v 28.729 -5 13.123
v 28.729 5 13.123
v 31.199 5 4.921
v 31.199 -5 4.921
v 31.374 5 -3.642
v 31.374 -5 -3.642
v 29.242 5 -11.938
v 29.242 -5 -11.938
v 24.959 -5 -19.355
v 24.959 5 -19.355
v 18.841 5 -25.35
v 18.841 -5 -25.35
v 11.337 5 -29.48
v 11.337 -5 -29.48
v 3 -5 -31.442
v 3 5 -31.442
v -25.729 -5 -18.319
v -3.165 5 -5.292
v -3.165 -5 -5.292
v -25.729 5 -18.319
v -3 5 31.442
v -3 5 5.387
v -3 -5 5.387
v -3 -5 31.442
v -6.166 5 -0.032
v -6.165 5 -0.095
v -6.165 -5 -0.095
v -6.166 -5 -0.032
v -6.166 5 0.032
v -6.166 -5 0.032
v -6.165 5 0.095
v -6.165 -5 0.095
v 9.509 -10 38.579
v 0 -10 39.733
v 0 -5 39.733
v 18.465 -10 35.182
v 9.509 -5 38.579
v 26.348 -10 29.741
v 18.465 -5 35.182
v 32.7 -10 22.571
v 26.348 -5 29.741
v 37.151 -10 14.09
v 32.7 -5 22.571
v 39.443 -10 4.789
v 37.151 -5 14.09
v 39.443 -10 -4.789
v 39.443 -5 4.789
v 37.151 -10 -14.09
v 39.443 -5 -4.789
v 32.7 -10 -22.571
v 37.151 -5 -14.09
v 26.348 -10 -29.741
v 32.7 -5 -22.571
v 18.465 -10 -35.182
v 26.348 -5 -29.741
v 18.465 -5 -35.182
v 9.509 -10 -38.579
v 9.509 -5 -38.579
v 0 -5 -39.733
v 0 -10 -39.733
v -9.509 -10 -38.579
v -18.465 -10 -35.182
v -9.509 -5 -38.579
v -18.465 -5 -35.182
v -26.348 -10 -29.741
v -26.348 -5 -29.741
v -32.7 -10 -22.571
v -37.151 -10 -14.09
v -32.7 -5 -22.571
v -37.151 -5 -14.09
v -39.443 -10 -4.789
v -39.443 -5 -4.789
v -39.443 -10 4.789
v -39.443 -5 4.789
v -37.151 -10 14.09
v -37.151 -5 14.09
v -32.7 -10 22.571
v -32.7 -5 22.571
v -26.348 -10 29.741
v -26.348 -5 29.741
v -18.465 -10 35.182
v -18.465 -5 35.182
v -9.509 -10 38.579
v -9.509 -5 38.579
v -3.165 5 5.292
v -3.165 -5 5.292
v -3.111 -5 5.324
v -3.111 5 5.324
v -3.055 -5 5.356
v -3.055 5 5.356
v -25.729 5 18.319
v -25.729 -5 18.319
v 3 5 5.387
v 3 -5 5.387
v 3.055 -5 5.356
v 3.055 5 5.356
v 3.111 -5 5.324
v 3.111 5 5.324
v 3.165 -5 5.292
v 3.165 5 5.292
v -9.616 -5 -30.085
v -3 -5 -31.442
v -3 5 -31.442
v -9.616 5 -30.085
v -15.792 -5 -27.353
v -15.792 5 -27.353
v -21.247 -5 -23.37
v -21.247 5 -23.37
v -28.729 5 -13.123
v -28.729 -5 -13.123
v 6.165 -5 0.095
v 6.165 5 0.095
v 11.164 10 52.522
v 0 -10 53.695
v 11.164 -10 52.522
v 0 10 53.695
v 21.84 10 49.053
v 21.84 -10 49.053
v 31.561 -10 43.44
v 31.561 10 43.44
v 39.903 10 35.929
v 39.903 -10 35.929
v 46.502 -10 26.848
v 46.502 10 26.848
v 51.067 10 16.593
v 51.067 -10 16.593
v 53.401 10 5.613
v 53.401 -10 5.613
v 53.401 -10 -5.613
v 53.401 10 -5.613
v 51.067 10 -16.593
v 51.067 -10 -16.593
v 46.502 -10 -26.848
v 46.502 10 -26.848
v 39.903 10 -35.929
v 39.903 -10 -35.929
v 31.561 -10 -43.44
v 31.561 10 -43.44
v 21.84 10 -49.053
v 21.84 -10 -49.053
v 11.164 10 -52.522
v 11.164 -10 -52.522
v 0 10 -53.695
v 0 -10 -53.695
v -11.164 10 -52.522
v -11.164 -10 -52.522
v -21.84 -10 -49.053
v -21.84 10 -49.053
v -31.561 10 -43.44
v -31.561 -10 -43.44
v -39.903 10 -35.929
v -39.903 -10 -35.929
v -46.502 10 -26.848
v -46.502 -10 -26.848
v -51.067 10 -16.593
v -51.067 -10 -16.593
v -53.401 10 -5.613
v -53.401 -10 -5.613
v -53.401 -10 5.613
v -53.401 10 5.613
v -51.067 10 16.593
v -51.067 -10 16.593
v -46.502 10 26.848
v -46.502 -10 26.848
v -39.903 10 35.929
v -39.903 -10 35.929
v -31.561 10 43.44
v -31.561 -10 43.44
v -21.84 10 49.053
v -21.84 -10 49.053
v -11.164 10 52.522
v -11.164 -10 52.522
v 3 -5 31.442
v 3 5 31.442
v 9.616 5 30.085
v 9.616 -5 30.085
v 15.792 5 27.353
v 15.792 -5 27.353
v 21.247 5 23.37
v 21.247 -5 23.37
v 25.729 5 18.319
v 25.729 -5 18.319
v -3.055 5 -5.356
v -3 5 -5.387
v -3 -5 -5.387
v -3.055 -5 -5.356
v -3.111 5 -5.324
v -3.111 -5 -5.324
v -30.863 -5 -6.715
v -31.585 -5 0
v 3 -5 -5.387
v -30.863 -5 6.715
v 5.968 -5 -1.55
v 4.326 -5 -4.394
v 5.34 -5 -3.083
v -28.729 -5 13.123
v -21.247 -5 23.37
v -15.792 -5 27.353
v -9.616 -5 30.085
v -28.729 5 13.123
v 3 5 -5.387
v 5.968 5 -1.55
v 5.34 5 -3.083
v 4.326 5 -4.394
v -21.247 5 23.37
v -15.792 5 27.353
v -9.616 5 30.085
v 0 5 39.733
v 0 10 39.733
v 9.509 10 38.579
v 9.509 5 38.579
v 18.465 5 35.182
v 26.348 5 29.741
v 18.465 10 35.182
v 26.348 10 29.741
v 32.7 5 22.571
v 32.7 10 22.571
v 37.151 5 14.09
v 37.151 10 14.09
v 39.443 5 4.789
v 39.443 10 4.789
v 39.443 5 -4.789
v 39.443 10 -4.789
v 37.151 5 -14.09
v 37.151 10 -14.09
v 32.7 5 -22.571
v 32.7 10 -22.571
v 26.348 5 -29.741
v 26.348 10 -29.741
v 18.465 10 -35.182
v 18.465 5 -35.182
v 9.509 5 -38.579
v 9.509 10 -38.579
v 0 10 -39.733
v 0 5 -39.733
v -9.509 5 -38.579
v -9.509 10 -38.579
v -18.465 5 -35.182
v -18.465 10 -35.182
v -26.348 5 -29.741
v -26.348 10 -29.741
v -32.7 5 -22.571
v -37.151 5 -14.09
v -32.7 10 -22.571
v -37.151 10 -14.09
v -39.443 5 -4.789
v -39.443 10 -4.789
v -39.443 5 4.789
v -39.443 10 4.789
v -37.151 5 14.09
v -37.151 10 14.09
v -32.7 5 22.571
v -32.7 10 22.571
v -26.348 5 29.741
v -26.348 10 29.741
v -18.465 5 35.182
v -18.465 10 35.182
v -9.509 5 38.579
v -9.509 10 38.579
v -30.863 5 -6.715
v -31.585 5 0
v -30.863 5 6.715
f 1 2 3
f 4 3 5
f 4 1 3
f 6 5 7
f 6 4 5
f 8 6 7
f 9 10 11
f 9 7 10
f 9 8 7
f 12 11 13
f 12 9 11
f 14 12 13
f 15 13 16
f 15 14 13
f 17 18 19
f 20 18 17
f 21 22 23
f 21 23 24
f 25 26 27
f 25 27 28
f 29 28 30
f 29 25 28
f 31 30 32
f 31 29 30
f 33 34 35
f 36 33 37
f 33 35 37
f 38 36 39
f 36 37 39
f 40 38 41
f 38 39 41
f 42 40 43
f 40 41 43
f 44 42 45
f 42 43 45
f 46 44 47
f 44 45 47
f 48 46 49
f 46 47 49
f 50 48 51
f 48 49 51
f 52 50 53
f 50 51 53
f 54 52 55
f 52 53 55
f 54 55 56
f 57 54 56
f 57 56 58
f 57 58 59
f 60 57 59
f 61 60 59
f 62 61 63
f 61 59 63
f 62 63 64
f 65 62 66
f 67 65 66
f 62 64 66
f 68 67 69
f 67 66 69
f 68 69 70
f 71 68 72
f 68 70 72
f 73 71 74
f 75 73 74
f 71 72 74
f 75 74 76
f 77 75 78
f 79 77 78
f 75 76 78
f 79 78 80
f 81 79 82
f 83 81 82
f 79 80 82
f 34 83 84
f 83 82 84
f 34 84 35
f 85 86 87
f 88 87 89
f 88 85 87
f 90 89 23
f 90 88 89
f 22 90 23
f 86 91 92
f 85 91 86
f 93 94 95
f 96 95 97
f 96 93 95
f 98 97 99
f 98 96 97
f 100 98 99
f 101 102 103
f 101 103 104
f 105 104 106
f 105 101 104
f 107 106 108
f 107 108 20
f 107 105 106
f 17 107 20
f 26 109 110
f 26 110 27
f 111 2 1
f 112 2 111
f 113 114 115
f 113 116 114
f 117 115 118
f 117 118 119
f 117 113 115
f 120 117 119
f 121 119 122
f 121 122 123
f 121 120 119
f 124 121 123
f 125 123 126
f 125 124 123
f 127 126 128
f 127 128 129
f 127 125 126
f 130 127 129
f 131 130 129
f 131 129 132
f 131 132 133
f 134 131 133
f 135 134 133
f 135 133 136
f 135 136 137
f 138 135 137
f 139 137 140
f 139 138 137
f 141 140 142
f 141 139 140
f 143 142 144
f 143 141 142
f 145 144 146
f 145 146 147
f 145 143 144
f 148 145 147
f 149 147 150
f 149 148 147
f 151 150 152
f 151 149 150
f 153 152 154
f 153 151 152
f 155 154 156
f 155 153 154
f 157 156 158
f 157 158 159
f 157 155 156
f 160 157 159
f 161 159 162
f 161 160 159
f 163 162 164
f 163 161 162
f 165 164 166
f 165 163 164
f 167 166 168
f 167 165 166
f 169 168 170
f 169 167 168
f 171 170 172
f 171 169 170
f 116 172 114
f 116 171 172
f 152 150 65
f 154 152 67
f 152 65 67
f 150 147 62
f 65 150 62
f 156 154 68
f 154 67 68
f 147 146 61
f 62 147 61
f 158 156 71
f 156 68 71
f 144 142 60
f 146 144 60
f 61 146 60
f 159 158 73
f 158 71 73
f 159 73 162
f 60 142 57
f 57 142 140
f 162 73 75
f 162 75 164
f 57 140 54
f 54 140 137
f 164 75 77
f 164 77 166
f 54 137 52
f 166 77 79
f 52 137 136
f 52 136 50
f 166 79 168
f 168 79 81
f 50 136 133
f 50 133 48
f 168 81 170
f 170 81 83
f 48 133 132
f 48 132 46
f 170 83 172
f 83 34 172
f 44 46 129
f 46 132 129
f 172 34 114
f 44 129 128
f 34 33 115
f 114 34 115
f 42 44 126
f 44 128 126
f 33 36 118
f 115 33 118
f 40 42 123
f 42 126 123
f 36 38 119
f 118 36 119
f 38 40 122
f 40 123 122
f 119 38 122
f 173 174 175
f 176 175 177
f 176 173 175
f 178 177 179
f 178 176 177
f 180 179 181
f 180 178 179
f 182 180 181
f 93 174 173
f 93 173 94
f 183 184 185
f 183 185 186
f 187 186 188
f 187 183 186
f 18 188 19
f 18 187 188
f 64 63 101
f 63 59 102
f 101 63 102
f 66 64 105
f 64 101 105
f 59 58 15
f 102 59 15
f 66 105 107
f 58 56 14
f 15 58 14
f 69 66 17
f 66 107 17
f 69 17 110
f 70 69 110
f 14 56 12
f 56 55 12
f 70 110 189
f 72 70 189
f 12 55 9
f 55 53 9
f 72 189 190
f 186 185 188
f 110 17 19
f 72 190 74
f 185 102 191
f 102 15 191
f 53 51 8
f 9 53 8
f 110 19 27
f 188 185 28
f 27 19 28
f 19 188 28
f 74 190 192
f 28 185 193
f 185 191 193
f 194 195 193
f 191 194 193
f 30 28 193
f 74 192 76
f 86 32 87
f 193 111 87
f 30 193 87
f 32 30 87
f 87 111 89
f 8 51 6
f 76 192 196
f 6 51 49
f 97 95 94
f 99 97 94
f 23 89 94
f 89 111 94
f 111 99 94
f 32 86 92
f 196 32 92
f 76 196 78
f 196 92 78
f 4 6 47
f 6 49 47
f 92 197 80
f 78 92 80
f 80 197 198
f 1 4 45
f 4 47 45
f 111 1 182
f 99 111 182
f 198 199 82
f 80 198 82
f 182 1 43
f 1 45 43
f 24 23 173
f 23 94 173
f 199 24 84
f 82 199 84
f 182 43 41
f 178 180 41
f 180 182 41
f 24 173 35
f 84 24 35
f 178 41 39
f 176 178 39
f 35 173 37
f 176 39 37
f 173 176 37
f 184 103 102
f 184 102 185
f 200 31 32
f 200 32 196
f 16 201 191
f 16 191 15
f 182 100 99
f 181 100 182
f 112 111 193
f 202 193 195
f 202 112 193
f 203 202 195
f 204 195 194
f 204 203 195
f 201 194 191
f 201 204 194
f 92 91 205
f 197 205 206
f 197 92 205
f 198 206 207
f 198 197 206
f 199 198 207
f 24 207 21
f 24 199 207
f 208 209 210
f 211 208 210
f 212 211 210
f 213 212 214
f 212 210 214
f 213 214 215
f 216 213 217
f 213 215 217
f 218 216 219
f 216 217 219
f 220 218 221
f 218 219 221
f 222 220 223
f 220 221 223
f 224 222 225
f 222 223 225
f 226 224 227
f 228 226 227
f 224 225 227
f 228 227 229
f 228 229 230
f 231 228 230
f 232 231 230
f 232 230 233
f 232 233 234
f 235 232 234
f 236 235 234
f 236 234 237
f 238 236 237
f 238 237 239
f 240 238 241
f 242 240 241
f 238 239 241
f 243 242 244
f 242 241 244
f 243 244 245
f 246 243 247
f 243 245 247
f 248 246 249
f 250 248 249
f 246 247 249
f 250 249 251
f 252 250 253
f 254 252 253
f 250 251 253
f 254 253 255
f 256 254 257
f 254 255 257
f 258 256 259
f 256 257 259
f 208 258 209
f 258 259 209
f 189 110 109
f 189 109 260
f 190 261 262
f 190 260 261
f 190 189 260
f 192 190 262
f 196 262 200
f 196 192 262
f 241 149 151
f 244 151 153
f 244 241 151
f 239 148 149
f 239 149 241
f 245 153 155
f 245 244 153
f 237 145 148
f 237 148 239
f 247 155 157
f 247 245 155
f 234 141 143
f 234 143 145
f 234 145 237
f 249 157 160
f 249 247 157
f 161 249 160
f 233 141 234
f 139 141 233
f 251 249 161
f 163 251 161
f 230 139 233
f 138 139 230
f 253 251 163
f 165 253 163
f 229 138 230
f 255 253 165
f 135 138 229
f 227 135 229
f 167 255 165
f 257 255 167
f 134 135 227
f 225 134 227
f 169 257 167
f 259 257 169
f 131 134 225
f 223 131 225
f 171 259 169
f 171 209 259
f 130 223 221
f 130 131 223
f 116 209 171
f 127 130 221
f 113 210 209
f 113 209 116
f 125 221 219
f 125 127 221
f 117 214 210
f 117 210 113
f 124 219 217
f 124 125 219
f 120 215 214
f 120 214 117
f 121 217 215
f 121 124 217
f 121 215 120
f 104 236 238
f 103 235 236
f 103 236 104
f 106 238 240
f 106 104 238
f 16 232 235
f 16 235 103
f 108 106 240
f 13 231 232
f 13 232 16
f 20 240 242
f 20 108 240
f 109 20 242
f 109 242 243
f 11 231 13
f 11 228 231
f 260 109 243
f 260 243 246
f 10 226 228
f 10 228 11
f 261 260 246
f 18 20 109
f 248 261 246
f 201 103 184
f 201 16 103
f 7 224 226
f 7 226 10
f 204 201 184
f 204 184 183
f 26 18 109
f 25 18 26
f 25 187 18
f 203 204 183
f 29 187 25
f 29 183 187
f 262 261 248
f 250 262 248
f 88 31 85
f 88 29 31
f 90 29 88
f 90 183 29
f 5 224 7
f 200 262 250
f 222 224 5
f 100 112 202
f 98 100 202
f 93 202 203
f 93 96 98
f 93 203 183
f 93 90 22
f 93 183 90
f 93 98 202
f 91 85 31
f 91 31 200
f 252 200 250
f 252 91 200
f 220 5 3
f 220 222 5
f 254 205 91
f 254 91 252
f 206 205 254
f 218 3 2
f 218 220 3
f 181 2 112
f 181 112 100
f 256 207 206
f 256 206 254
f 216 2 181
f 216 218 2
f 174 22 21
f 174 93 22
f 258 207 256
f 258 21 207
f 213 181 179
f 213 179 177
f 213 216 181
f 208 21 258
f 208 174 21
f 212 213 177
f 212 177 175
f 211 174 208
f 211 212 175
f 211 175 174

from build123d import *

# Parameters (mm, degrees)
SKETCH1_R           = 53.695322997
BOSS_EXTRUDE2_DEPTH = 10
SKETCH3_R           = 39.733093336
CUT_EXTRUDE2_DEPTH  = 10
SKETCH4_R           = 39.733093336
SKETCH4_R_2         = 31.58457531
BOSS_EXTRUDE3_DEPTH = 5
BOSS_EXTRUDE4_DEPTH = 5
CIRPATTERN3_COUNT   = 5
CIRPATTERN3_ANGLE   = 240


with BuildPart() as part:
    # Sketch1 → Boss-Extrude2 (new, symmetric)
    with BuildSketch(Plane(origin=(0, 0, 0), x_dir=(1, 0, 0), z_dir=(0, 1, 0))):
        with Locations(Location((0, 0, 0), (0, 0, 270))):
            Circle(SKETCH1_R)
    extrude(amount=BOSS_EXTRUDE2_DEPTH, both=True)

    # Sketch3 → Cut-Extrude2 (cut, symmetric)
    with BuildSketch(Plane(origin=(0, 0, 0), x_dir=(1, 0, 0), z_dir=(0, 1, 0))):
        with Locations(Location((0, 0, 0), (0, 0, 270))):
            Circle(SKETCH3_R)
    extrude(amount=CUT_EXTRUDE2_DEPTH, both=True, mode=Mode.SUBTRACT)

    # Sketch4 → Boss-Extrude3 (add, symmetric)
    with BuildSketch(Plane(origin=(0, 0, 0), x_dir=(1, 0, 0), z_dir=(0, 1, 0))):
        with Locations(Location((0, 0, 0), (0, 0, 270))):
            Circle(SKETCH4_R)
        with Locations(Location((0, 0, 0), (0, 0, 270))):
            Circle(SKETCH4_R_2, mode=Mode.SUBTRACT)
    extrude(amount=BOSS_EXTRUDE3_DEPTH, both=True)

    # Sketch6 → Boss-Extrude4 (add, symmetric)
    with BuildSketch(Plane(origin=(0, 0, 0), x_dir=(1, 0, 0), z_dir=(0, 1, 0))):
        with BuildLine():
            Line((3, 5.387115822), (3, 39.619675744))
            Line((3, 39.619675744), (-3, 39.619675744))
            Line((-3, 39.619675744), (-3, 5.387115822))
            ThreePointArc((-3, 5.387115822), (0, -6.166118461), (3, 5.387115822))
        make_face()
    boss_extrude4 = extrude(amount=BOSS_EXTRUDE4_DEPTH, both=True)

    # CirPattern3: Boss-Extrude4 ×5 about axis
    cirpattern3_axis = Axis((0, 0, 0), (0, 1, 0))
    for i in range(1, CIRPATTERN3_COUNT):
        add(boss_extrude4.rotate(cirpattern3_axis, i * CIRPATTERN3_ANGLE / (CIRPATTERN3_COUNT - 1)))


solid = part.part
